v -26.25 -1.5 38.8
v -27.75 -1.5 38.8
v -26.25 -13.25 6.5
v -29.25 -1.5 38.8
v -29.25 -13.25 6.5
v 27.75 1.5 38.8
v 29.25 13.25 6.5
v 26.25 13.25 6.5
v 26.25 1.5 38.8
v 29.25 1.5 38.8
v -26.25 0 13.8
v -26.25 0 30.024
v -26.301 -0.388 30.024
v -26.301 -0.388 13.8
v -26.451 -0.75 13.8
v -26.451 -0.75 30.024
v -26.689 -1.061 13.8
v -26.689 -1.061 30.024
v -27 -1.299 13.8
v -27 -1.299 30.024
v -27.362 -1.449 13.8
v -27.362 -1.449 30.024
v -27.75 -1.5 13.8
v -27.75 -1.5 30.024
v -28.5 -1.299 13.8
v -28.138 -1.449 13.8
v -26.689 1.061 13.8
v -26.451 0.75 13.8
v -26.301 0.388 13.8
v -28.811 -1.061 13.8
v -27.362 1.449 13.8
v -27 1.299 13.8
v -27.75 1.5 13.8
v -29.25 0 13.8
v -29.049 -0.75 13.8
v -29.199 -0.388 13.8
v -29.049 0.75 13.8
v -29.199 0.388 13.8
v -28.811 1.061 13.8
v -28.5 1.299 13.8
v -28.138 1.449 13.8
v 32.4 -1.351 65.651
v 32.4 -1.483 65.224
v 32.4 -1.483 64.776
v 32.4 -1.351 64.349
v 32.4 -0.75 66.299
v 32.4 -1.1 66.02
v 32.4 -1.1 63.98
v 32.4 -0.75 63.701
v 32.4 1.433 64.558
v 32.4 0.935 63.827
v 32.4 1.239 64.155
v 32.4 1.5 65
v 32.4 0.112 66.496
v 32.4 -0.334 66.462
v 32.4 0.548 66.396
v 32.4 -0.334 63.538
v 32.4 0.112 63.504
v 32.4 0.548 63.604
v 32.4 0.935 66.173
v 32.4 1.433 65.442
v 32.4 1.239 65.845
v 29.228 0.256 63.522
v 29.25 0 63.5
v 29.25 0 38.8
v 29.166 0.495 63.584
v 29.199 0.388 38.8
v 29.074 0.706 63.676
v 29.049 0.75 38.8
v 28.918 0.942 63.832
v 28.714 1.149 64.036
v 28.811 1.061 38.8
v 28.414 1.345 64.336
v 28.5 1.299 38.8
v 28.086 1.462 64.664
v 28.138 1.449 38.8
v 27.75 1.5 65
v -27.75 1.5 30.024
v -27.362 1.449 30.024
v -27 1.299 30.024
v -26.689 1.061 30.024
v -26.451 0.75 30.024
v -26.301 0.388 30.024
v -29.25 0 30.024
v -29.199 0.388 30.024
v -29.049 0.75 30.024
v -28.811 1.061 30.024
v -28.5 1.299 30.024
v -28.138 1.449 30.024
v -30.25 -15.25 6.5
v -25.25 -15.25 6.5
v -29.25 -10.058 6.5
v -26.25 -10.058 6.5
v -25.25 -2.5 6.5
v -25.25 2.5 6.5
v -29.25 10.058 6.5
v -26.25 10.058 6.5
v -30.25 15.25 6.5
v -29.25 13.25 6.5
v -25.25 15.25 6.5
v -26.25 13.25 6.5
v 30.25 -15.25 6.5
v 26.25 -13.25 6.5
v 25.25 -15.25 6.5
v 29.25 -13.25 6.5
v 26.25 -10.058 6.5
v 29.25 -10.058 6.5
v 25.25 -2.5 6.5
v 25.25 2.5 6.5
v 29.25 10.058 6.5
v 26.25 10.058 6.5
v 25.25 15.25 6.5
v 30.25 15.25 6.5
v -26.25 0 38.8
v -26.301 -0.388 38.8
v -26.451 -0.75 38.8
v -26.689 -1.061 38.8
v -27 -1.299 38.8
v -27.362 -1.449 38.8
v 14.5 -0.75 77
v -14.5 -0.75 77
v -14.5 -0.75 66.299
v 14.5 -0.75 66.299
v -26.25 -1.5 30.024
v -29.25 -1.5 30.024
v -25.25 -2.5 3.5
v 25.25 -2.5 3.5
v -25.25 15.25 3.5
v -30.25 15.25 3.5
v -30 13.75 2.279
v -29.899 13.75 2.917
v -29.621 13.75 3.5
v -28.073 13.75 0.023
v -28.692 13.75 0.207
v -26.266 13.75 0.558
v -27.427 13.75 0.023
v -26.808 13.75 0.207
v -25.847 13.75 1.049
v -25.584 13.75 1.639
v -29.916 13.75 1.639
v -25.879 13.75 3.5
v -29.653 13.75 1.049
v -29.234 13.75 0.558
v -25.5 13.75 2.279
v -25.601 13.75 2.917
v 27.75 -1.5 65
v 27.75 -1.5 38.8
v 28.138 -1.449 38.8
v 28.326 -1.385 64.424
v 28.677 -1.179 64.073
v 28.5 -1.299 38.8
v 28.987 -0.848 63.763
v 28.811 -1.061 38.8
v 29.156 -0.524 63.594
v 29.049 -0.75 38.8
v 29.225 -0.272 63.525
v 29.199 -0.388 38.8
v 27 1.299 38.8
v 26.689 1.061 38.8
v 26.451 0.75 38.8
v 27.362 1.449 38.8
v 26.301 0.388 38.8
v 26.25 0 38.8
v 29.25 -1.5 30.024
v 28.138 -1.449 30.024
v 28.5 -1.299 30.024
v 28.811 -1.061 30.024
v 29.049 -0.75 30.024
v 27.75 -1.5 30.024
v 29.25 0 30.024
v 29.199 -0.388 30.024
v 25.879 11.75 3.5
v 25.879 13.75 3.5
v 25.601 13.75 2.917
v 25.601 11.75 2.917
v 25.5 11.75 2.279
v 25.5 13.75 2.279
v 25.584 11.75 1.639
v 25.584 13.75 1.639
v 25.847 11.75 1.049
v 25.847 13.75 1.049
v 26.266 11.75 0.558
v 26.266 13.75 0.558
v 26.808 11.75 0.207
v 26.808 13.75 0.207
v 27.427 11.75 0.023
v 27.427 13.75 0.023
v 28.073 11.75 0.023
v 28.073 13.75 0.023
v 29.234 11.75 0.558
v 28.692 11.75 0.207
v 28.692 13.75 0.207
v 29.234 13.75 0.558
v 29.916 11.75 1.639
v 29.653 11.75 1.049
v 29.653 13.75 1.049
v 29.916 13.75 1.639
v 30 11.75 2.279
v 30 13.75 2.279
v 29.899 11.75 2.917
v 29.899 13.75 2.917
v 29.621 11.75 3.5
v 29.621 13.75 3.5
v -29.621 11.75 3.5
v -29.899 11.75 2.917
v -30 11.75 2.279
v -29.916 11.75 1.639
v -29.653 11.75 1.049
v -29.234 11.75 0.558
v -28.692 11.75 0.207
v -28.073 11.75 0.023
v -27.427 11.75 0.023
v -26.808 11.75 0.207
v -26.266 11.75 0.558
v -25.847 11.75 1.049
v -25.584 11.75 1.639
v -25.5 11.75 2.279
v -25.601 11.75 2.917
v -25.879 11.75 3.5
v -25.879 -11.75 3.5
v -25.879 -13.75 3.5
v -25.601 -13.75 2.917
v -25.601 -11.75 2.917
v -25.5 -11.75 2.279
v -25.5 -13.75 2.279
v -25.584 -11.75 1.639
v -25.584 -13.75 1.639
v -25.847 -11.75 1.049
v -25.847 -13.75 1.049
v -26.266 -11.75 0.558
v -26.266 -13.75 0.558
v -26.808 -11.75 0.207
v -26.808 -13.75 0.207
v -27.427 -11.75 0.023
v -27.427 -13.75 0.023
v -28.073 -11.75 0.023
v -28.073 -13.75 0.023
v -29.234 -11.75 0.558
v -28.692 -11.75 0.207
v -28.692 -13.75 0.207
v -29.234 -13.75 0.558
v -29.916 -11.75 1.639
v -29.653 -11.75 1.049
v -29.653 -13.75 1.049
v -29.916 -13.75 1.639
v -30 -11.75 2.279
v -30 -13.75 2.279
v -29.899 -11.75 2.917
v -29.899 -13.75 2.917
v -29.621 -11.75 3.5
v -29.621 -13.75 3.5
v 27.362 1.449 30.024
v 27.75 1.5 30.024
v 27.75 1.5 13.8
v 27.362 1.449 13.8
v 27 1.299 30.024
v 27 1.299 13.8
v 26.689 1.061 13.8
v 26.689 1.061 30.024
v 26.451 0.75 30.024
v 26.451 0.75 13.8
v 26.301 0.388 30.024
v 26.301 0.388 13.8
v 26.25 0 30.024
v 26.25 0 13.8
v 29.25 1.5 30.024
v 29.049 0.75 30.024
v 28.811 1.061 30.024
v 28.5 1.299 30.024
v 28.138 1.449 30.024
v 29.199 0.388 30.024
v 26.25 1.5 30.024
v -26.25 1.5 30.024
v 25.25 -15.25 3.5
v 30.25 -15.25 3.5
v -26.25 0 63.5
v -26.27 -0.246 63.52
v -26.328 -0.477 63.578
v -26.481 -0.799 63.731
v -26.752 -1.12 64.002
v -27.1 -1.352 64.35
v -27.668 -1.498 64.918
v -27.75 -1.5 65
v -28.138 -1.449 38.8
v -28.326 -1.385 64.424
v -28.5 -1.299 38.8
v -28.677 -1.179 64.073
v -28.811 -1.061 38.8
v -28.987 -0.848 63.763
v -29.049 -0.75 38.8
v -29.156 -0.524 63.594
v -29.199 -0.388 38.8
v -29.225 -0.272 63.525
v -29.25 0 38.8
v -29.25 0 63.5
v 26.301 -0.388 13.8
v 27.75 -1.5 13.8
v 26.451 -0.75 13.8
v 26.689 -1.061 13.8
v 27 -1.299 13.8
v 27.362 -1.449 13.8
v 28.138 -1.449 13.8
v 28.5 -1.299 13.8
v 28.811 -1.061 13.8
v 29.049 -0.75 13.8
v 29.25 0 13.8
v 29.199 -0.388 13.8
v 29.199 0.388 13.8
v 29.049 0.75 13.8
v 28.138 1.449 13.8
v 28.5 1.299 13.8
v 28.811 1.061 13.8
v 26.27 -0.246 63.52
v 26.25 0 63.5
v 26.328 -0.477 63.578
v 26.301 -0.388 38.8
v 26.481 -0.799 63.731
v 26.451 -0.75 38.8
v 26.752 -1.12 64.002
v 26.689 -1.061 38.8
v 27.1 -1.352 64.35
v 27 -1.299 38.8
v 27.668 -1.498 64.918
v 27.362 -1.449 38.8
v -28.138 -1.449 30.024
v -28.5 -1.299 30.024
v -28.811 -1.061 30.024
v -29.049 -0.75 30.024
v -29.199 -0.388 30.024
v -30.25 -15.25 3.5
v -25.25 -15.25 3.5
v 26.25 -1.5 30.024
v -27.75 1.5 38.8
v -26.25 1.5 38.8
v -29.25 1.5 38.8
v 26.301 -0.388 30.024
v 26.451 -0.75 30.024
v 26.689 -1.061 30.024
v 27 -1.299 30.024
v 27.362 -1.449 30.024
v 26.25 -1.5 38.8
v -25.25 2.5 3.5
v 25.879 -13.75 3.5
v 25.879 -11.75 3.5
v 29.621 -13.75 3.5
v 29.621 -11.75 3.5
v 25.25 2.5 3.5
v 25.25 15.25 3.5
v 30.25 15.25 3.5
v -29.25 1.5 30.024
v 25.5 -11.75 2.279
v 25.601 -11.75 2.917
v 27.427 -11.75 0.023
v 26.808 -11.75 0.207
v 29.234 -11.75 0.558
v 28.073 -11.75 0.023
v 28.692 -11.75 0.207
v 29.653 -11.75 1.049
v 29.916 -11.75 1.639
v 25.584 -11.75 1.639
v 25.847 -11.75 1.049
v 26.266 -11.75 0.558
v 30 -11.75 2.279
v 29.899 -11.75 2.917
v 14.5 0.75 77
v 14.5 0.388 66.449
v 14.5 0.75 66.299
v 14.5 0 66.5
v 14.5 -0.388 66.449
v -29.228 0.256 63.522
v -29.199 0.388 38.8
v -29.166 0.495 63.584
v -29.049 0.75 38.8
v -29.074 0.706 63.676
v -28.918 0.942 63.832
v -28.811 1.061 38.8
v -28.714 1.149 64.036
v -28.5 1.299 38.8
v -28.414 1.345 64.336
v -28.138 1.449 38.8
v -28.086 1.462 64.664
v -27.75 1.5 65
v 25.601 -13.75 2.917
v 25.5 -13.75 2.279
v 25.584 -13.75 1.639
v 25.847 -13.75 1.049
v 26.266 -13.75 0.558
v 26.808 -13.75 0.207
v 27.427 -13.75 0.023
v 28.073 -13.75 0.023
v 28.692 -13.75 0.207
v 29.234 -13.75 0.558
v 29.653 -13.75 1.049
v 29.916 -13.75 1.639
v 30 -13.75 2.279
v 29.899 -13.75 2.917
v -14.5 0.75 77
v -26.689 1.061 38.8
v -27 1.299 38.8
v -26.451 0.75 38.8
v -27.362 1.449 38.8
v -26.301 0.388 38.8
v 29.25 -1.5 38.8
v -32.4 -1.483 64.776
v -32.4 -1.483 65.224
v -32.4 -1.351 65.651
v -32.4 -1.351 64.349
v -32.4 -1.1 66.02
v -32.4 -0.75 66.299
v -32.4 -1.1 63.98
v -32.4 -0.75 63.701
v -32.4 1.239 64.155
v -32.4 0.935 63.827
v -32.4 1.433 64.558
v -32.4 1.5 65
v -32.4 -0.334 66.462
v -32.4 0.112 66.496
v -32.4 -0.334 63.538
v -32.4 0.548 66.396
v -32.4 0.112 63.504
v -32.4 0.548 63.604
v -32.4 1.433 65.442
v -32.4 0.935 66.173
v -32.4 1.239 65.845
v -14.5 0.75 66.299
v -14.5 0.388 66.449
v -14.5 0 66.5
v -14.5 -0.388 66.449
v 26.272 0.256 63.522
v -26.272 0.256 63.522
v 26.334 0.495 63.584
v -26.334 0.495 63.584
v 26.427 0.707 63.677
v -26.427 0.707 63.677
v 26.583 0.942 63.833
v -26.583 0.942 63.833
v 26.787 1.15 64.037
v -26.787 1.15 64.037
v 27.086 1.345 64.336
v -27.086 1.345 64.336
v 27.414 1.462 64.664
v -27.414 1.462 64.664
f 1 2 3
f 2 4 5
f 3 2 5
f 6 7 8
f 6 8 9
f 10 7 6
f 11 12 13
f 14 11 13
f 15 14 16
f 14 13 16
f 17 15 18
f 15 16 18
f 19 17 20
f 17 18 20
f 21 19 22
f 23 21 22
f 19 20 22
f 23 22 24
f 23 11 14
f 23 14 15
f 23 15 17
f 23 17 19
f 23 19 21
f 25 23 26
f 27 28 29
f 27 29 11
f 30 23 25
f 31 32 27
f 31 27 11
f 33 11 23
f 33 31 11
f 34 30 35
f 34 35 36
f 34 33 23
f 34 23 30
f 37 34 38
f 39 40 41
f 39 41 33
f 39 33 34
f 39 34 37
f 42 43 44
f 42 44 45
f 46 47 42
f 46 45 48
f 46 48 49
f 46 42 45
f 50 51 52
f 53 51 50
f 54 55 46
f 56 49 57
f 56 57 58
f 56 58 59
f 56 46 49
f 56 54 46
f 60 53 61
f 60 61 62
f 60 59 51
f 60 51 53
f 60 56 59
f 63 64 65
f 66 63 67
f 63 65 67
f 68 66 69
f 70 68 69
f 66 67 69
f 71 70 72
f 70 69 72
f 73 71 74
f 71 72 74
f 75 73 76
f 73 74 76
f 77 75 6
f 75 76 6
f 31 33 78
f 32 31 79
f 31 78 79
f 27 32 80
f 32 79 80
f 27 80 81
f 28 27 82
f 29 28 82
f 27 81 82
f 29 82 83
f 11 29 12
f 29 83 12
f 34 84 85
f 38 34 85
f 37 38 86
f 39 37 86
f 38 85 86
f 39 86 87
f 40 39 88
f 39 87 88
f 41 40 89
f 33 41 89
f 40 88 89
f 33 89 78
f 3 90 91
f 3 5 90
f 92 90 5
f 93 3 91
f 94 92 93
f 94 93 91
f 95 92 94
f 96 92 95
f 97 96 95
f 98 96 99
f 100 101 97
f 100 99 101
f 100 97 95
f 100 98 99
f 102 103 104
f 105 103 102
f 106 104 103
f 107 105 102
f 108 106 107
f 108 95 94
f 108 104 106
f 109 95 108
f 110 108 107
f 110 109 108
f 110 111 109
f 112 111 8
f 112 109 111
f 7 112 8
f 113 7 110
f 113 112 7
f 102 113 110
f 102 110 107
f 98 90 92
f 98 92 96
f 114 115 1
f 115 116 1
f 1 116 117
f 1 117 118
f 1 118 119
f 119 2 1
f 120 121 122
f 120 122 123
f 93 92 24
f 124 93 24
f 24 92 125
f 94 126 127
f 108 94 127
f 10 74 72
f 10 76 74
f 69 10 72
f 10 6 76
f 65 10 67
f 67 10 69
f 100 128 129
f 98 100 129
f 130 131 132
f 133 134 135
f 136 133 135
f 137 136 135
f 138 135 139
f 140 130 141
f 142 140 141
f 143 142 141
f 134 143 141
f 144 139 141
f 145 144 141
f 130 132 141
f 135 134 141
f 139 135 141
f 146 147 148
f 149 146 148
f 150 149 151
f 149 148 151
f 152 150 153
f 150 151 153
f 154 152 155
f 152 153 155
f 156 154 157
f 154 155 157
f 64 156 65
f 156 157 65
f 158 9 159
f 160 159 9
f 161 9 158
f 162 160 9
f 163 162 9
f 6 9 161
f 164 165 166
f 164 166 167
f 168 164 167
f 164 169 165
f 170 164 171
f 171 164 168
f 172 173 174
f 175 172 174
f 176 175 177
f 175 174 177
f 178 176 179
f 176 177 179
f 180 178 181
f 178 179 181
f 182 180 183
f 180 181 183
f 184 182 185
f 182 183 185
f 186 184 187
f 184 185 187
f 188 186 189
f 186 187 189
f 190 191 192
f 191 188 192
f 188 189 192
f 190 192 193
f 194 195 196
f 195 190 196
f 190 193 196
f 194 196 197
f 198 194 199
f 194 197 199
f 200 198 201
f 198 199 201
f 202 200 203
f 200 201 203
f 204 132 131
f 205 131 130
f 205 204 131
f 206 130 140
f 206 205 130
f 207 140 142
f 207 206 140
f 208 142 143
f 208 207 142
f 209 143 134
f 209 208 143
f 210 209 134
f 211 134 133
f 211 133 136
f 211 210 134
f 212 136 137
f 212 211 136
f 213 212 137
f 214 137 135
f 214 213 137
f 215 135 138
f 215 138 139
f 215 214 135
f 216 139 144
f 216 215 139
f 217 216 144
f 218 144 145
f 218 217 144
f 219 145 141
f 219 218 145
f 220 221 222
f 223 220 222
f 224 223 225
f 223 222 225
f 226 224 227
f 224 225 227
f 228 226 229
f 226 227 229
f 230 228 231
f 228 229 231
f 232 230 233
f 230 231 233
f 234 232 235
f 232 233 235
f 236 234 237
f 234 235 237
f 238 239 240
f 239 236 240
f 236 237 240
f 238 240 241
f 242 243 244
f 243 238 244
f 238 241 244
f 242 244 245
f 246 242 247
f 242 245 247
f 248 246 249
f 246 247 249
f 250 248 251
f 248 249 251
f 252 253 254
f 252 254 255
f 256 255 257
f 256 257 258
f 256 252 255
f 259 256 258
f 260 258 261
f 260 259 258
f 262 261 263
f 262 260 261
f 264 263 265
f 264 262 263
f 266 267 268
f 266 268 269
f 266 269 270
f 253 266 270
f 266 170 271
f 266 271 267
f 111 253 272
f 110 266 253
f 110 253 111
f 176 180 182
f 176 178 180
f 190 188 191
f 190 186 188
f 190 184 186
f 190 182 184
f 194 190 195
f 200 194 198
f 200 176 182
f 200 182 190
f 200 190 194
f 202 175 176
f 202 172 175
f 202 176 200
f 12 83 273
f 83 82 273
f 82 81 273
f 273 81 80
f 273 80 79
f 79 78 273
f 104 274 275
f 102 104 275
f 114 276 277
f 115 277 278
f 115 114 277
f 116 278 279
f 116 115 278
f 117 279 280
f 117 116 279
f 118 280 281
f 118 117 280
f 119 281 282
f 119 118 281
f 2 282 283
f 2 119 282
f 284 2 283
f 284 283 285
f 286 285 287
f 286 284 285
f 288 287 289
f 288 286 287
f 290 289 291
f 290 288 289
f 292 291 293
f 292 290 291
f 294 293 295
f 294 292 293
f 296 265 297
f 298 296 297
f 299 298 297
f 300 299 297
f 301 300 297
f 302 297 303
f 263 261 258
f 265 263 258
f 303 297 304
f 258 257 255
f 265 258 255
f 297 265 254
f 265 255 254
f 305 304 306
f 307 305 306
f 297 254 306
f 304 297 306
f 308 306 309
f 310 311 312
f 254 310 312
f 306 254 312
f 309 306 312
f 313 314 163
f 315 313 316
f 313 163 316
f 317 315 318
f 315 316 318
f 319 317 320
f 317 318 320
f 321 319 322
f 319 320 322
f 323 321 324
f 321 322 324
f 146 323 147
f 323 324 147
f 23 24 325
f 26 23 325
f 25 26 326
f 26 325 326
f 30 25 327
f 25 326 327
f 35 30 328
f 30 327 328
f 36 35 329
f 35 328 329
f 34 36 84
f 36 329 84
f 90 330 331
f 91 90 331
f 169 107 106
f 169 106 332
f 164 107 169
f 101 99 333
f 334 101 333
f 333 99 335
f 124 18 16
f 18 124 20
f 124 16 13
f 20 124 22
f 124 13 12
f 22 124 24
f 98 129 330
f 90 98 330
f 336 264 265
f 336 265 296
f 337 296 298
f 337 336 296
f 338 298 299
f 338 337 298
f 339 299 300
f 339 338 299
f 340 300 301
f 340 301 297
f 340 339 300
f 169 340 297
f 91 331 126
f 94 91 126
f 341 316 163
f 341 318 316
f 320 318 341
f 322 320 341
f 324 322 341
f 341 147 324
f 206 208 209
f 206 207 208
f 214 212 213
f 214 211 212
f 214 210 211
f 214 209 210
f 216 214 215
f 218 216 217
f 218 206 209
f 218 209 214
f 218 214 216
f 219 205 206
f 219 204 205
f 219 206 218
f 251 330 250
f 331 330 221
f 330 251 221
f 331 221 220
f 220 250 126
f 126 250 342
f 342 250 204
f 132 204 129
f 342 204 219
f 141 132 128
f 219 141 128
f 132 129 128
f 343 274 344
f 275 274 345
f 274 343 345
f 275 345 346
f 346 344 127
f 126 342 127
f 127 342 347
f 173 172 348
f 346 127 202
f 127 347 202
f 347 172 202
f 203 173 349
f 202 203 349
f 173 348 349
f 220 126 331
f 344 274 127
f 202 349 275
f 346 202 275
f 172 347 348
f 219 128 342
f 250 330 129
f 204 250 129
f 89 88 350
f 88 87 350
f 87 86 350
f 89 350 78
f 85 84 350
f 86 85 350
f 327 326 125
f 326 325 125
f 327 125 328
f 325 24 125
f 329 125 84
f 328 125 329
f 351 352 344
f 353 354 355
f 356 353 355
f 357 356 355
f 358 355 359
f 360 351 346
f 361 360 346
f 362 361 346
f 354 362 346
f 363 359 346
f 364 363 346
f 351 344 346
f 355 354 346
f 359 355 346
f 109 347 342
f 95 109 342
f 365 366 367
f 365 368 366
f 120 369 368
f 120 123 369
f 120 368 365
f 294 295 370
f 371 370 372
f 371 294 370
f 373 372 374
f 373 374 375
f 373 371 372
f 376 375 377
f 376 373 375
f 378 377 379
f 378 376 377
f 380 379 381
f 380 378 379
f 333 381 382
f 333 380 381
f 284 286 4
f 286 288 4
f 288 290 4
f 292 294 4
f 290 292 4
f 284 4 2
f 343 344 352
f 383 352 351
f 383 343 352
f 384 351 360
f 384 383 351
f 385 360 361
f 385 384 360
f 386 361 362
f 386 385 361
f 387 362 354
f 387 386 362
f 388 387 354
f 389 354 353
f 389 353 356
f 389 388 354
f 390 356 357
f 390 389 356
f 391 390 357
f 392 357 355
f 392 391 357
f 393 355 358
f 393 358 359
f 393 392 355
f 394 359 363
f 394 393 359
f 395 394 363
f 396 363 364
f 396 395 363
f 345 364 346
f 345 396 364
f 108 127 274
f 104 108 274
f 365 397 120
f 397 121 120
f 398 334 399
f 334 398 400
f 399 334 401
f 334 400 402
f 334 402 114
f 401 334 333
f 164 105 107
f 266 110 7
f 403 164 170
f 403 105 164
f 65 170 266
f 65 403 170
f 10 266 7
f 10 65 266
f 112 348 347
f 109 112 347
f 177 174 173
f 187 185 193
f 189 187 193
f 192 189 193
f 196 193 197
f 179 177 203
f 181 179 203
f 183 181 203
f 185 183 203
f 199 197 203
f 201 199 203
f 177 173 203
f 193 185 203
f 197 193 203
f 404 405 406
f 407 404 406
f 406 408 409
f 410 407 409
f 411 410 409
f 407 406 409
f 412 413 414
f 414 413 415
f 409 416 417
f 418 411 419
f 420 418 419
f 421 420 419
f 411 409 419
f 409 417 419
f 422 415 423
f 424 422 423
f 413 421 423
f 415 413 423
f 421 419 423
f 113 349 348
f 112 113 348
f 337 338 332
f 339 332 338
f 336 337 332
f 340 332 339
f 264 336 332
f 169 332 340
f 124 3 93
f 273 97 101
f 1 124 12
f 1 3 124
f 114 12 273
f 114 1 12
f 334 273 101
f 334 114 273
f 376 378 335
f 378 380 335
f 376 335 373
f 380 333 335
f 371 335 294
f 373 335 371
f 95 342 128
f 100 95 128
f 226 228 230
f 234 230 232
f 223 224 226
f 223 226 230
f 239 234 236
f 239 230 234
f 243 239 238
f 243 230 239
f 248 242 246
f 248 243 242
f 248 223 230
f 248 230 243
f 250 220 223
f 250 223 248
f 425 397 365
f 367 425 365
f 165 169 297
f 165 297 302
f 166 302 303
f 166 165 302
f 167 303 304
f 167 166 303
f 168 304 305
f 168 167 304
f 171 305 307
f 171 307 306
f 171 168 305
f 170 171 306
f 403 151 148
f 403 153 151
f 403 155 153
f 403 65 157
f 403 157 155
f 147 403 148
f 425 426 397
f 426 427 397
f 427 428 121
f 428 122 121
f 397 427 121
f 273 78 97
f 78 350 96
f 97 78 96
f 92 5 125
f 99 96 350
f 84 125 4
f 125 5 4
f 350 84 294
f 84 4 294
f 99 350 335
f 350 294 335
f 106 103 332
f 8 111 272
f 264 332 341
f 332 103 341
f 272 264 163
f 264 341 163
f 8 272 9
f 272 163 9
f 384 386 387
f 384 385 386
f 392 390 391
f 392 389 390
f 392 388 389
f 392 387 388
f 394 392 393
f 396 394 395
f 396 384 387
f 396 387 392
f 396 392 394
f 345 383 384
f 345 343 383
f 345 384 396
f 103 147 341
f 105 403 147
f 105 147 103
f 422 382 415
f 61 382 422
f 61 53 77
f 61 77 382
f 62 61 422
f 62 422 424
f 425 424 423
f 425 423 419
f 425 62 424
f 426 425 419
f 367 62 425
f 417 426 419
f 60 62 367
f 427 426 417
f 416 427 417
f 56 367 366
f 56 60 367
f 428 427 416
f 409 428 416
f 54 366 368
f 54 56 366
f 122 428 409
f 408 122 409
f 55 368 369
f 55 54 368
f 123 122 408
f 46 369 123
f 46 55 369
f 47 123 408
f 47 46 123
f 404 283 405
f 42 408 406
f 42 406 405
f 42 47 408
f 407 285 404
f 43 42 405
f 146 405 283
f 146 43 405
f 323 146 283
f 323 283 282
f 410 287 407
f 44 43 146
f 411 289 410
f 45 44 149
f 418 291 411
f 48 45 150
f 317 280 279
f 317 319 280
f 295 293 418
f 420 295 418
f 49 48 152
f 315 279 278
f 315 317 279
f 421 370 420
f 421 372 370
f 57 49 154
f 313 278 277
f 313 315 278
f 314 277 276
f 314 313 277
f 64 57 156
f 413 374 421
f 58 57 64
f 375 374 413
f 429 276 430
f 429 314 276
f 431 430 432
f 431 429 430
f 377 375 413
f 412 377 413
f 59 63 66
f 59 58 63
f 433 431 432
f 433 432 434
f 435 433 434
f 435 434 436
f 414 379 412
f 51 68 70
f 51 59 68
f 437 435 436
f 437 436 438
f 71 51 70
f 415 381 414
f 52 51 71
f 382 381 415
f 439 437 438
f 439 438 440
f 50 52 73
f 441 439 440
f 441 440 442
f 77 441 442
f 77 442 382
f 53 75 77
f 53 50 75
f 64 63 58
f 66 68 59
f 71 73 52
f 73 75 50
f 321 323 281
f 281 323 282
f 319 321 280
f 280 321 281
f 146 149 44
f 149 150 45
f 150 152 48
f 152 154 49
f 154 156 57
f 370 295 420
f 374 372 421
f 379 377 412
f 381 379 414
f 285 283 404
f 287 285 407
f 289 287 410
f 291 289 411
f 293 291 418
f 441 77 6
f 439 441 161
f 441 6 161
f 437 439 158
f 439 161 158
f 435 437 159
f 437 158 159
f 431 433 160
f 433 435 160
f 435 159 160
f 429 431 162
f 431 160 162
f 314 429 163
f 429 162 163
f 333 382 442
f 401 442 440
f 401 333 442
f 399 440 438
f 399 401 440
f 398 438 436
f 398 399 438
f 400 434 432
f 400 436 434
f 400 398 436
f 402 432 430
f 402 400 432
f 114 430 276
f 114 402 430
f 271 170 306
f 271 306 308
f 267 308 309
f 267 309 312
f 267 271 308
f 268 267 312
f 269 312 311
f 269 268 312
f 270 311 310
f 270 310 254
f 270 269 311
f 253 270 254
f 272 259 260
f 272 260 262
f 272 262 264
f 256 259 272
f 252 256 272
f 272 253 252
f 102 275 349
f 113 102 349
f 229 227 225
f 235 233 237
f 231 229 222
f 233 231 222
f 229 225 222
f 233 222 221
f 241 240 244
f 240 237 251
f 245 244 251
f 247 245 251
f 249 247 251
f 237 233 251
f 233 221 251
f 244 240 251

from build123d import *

# Parameters (mm, degrees)
F2_DEPTH          = 3
F6_DEPTH          = 1.5
F9_DEPTH          = 26.2
F9_DEPTH_BACK     = 25
F10_R             = 1.5
F11_DEPTH         = 32.4
F13_R             = 2.25
F14_DEPTH         = 2
F14_COPIES2_COUNT = 2
F14_COPIES2_PITCH = 61.077819
F15_W             = 29
F15_H             = 11
F16_DEPTH         = 0.75


# Not quite as in the source:
# - a pattern or mirror of a feature is missing from the dataset's text; its kind, count and spacing are read off the source's solid


with BuildPart() as f2:
    # F1 (on offset) → F2 (new body)
    with BuildSketch(Plane.XY.offset(3.5)):
        Polygon((-25.25, -15.25), (-25.25, -2.5), (-25.25, 2.5), (-25.25, 15.25), (-30.25, 15.25), (-30.25, 0), (-30.25, -15.25), align=None)
        Polygon((0, -2.5), (25.25, -2.5), (25.25, 2.5), (0, 2.5), (-25.25, 2.5), (-25.25, -2.5), align=None)
        Polygon((30.25, -15.25), (30.25, 0), (30.25, 15.25), (25.25, 15.25), (25.25, 2.5), (25.25, -2.5), (25.25, -15.25), align=None)
    extrude(amount=F2_DEPTH)

    # F5 (on plane+point) → F6 (join, symmetric)
    with BuildSketch(Plane.YZ.offset(27.75)):
        Polygon((10.057664814, 6.5), (13.25, 6.5), (1.5, 38.8), (0, 38.8), (-1.5, 38.8), (-13.25, 6.5), (-10.057664814, 6.5), (-1.5, 30.0244743399), (0, 30.0244743399), (1.5, 30.0244743399), align=None)
    f6 = extrude(amount=F6_DEPTH, both=True)

    # F6_copies: F6 across plane
    add(f6.mirror(Plane(origin=(0, 0, 0), x_dir=(0, 0, -1), z_dir=(-1, 0, 0))))

    # F8 (on face) → F9 (join, two sides)
    with BuildSketch(Plane.XY.offset(38.8)) as f9_sk:
        with BuildLine():
            ThreePointArc((27.75, -1.5), (28.8106601718, -1.0606601718), (29.25, 0))
            ThreePointArc((29.25, 0), (28.8106601718, 1.0606601718), (27.75, 1.5))
            ThreePointArc((27.75, 1.5), (26.68933982, 1.0606601636), (26.25, -2.31e-08))
            ThreePointArc((26.25, -2.31e-08), (26.6893398364, -1.06066018), (27.75, -1.5))
        make_face()
    f9 = extrude(amount=F9_DEPTH) + extrude(f9_sk.sketch, amount=-F9_DEPTH_BACK)

    # F9_copies: F9 across plane
    add(f9.mirror(Plane(origin=(0, 0, 0), x_dir=(0, 0, -1), z_dir=(-1, 0, 0))))

    # F10 (on Right) → F11 (join, symmetric)
    with BuildSketch(Plane.YZ):
        with Locations((0, 65)):
            Circle(F10_R)
    extrude(amount=F11_DEPTH, both=True)

    # F13 (on offset) → F14 (join)
    with BuildSketch(Plane.XZ.offset(13.75)):
        with Locations((27.75, 2.25)):
            Circle(F13_R)
    f14 = extrude(amount=-F14_DEPTH)

    # F14_copies: F14 across plane
    add(f14.mirror(Plane.ZX))

    # F14_copies1: F14 across plane
    add(f14.mirror(Plane(origin=(0, 0, 0), x_dir=(0, 0, -1), z_dir=(-1, 0, 0))))

    # F14_copies2: F14 ×2
    with Locations(*[Vector(-0.908676844, 0.4175001716, 0) * (i * F14_COPIES2_PITCH) for i in range(1, F14_COPIES2_COUNT)]):
        add(f14)

    # F15 (on Front) → F16 (join, symmetric)
    with BuildSketch(Plane.XZ):
        with Locations((0, 71.5)):
            Rectangle(F15_W, F15_H)
    extrude(amount=F16_DEPTH, both=True)


solid = f2.part
